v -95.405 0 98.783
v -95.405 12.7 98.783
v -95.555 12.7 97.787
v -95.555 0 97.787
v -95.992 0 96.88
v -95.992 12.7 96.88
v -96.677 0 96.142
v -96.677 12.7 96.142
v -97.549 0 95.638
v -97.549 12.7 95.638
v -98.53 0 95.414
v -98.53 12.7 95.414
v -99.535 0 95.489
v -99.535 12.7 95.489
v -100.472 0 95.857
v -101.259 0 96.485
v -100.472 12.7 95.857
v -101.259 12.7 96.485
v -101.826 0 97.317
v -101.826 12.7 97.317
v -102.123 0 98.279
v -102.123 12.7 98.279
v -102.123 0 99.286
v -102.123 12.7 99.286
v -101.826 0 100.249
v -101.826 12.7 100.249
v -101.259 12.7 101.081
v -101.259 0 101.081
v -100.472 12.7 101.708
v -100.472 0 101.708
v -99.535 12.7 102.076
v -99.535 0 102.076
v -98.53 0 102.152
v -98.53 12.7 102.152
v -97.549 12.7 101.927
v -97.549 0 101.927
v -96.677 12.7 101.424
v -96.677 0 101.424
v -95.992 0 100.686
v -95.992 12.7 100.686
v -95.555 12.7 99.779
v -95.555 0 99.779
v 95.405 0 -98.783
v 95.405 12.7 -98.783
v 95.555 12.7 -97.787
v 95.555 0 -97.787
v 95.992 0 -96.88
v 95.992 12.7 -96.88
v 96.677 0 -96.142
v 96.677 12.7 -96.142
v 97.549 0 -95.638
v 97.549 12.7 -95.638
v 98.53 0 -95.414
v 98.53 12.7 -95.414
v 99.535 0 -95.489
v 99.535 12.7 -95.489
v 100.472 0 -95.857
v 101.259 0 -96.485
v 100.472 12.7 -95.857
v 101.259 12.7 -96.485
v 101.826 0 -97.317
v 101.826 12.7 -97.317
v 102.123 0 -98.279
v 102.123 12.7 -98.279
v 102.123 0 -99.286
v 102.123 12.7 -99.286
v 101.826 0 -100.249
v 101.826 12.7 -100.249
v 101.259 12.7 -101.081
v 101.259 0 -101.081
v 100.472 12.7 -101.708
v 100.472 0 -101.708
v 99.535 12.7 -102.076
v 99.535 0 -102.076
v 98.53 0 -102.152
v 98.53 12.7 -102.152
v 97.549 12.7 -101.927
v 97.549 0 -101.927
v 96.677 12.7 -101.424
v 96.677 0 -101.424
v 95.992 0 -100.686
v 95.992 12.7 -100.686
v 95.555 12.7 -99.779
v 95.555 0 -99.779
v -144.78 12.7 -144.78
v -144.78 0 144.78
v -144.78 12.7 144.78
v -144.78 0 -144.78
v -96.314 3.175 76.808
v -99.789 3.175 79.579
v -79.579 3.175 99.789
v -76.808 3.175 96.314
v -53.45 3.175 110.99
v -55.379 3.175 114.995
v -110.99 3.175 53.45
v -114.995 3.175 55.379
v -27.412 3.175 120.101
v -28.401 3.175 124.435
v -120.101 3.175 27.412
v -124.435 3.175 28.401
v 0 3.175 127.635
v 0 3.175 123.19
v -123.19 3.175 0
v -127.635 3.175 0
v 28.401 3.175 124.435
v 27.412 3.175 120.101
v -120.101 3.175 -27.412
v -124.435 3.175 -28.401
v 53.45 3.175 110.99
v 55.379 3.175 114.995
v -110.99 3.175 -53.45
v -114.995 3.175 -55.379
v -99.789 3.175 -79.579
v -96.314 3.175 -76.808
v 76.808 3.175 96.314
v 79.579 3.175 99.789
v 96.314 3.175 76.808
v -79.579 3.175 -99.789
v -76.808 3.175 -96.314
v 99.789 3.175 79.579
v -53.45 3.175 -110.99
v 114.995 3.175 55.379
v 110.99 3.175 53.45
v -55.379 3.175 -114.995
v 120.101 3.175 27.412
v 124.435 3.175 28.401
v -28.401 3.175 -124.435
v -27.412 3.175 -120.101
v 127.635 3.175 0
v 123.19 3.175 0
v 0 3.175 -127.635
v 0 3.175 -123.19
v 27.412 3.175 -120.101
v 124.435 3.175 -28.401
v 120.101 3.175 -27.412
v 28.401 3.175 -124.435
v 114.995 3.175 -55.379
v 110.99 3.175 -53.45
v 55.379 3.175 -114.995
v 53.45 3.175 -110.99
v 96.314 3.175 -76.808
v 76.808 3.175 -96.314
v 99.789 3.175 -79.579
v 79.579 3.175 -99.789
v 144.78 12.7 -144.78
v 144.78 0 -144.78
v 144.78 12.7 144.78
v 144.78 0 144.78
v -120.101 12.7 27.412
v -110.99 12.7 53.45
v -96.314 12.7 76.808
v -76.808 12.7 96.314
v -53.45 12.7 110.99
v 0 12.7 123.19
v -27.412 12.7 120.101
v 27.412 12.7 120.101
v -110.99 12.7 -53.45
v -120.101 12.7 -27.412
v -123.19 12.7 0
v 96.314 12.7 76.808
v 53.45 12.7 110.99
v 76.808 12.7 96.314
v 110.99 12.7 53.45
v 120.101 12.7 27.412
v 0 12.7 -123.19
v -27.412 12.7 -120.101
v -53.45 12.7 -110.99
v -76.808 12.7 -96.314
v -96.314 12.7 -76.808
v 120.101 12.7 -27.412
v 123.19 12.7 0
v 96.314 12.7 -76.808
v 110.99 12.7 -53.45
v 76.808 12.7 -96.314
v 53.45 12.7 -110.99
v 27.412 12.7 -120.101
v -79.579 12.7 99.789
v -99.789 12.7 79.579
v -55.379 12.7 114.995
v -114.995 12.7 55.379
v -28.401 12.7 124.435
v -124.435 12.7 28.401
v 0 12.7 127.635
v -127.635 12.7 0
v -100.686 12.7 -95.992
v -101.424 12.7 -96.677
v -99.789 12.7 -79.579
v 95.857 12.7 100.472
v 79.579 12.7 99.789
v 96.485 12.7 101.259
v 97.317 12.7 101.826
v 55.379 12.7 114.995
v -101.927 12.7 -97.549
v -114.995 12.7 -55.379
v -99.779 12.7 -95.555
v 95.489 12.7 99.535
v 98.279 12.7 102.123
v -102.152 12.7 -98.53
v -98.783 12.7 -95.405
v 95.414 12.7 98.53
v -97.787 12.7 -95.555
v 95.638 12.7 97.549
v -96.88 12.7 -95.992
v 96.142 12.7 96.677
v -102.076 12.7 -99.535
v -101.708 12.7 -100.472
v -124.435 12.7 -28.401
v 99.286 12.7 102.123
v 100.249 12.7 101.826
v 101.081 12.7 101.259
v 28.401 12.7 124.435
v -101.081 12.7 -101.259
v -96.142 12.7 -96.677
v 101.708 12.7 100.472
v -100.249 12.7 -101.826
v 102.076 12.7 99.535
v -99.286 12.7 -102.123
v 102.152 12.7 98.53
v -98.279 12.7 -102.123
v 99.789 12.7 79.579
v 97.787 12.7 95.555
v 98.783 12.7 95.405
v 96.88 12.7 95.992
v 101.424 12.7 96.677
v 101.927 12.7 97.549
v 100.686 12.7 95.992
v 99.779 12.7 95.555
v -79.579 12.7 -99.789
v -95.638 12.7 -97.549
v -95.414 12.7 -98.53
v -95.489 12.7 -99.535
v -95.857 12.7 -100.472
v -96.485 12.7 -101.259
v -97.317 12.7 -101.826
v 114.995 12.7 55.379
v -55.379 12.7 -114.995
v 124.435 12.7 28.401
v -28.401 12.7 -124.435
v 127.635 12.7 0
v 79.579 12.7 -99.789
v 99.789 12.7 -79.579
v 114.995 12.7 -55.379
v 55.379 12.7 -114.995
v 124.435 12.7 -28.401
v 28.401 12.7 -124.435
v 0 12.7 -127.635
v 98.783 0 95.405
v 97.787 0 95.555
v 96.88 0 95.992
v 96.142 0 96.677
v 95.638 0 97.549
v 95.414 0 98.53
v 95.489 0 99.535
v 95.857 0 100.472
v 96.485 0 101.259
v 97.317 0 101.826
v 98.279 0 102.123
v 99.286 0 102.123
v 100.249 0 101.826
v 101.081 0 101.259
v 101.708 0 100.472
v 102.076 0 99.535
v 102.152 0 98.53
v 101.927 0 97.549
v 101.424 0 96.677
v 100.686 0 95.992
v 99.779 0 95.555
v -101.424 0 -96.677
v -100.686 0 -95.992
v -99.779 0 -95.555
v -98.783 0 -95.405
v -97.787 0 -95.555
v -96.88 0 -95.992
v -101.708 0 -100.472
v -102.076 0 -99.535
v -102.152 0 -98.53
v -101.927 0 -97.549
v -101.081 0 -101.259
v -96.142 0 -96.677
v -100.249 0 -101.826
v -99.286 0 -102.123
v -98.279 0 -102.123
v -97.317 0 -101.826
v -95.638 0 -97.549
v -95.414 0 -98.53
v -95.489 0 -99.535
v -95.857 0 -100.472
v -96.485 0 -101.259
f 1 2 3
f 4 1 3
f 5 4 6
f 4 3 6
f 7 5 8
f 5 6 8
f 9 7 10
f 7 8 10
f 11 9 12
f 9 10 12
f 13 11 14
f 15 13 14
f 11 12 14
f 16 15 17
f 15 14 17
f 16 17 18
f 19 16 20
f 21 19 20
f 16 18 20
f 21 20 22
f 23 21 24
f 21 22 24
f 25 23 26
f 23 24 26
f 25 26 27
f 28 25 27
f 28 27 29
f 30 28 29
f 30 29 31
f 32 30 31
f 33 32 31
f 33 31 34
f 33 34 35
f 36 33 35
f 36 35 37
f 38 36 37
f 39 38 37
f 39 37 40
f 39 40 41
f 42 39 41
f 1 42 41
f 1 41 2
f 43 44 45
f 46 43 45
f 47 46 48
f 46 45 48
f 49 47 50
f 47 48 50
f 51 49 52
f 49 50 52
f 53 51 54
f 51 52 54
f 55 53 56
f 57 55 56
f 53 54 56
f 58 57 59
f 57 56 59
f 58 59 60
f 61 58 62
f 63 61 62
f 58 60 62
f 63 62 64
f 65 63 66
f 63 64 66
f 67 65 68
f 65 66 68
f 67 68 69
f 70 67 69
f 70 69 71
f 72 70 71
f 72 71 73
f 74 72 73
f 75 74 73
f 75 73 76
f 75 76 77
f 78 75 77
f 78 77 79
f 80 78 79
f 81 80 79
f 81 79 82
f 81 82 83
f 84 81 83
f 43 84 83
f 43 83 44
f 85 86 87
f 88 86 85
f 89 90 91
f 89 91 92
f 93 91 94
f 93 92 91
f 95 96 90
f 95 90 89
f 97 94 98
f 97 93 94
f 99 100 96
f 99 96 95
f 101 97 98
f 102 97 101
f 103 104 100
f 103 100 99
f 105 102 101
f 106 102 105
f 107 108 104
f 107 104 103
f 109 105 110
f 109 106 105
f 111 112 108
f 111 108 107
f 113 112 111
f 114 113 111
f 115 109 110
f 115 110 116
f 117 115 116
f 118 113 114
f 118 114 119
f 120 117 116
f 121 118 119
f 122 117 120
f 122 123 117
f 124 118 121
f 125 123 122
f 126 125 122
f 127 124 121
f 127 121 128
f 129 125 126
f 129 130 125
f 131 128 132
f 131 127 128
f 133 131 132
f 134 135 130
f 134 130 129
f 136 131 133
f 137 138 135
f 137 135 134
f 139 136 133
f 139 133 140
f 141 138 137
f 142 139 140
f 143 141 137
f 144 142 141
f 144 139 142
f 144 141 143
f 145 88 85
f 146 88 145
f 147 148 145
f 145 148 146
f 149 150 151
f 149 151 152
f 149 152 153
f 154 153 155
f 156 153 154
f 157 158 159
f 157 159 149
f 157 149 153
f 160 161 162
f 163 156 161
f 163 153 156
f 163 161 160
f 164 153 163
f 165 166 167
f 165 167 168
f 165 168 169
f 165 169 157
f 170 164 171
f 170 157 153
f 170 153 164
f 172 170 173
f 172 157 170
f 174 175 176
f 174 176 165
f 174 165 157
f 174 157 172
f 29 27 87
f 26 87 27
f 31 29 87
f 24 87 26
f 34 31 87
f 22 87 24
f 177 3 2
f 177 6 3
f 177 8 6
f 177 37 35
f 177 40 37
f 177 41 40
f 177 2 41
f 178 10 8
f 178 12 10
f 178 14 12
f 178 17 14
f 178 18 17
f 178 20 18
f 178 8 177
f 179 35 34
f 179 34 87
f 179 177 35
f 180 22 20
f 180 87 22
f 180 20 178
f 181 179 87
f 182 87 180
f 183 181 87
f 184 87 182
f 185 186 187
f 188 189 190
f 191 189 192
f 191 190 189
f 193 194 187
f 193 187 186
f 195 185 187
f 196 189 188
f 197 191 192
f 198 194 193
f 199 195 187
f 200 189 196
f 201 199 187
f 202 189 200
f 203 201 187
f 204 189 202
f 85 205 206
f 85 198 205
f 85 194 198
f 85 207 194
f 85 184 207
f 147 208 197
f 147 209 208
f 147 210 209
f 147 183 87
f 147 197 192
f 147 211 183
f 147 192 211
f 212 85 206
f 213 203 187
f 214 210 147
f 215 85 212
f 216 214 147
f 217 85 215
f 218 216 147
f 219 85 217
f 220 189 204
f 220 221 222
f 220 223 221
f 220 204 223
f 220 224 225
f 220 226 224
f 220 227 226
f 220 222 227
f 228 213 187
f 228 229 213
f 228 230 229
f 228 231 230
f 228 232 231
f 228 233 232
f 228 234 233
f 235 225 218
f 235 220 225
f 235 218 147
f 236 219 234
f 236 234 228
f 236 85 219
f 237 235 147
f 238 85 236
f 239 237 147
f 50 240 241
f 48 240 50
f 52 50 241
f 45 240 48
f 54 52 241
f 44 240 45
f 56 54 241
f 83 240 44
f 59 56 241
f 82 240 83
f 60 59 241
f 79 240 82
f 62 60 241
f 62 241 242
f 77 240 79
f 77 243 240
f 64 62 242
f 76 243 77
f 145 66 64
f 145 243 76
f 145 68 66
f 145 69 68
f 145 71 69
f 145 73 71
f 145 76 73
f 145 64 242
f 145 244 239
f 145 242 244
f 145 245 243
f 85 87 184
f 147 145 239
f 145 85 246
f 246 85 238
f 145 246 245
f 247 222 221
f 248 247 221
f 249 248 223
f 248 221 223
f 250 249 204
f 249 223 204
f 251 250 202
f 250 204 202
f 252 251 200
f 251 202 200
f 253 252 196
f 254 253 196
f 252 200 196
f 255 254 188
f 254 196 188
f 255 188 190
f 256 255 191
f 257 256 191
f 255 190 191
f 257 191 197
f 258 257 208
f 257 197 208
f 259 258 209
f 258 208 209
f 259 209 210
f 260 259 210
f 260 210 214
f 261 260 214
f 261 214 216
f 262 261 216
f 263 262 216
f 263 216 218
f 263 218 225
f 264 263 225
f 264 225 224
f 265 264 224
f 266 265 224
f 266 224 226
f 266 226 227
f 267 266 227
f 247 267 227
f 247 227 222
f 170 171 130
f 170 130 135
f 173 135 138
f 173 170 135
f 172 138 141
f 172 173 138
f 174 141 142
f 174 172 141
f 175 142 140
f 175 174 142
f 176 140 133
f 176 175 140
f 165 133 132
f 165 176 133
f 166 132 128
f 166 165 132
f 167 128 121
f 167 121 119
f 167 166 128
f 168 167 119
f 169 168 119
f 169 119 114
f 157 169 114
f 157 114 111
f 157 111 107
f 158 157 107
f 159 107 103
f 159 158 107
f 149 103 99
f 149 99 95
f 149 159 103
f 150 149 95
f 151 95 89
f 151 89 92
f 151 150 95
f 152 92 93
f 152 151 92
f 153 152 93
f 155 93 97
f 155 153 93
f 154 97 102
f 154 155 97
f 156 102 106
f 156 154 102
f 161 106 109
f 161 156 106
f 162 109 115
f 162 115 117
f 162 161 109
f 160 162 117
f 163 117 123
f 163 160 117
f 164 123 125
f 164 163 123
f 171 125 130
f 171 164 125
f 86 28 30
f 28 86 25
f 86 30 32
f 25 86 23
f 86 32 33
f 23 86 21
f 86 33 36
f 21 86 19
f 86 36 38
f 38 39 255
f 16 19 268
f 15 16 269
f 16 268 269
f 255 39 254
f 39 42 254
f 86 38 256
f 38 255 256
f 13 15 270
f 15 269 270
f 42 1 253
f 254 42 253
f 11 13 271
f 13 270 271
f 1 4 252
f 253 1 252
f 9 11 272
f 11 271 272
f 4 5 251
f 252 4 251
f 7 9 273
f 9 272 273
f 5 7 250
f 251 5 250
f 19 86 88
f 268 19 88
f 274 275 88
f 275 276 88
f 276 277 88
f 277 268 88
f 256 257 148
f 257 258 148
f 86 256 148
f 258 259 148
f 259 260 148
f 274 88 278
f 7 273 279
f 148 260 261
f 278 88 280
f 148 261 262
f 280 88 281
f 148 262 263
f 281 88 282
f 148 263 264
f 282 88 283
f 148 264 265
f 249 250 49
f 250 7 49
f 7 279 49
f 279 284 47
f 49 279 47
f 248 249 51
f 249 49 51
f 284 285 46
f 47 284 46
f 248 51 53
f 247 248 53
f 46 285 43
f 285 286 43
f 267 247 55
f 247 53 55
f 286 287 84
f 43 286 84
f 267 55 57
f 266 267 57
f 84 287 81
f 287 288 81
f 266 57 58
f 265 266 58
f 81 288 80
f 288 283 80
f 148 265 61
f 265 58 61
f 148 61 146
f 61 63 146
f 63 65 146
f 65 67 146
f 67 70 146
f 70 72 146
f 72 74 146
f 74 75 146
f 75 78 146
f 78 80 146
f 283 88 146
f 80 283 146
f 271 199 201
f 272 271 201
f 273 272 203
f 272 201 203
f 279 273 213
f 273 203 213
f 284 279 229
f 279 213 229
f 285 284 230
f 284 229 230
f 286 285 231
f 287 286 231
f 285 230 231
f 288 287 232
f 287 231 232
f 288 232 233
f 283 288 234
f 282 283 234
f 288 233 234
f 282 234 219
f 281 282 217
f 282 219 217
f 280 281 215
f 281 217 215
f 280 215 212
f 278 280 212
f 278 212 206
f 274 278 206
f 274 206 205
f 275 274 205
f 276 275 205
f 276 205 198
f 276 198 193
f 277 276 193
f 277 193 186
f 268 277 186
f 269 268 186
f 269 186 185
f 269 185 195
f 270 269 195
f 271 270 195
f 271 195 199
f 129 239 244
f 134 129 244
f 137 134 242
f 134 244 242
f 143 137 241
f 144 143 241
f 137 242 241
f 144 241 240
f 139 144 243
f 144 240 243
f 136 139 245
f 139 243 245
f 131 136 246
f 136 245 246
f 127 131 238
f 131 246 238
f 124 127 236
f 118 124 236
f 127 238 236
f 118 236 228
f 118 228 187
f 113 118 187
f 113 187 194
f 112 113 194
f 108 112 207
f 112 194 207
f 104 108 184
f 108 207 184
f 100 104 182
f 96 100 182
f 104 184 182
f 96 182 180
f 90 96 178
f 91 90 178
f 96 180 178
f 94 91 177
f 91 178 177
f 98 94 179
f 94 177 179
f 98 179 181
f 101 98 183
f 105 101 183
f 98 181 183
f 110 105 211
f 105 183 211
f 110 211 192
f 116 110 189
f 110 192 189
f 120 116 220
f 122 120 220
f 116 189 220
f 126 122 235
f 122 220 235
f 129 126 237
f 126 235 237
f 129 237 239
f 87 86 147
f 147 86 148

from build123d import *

# Parameters (mm, degrees)
SKETCH1_W               = 289.56
SKETCH1_H               = 289.56
BOSS_EXTRUDE1_DEPTH     = 12.7
SKETCH7_R               = 127.635
SKETCH7_R_2             = 123.19
CUT_EXTRUDE1_DEPTH      = 9.525
F_1_4_CLEARANCE_HOLE1_D = 6.7564
CIRPATTERN1_COUNT       = 4


with BuildPart() as part:
    # Sketch1 → Boss-Extrude1 (new body)
    with BuildSketch(Plane(origin=(0, 0, 0), x_dir=(1, 0, 0), z_dir=(0, 1, 0))):
        Rectangle(SKETCH1_W, SKETCH1_H)
    extrude(amount=BOSS_EXTRUDE1_DEPTH)

    # Sketch7 → Cut-Extrude1 (cut)
    with BuildSketch(Plane(origin=(0, 12.7, 0), x_dir=(1, 0, 0), z_dir=(0, 1, 0))):
        Circle(SKETCH7_R)
        Circle(SKETCH7_R_2, mode=Mode.SUBTRACT)
    extrude(amount=-CUT_EXTRUDE1_DEPTH, mode=Mode.SUBTRACT)

    # 1/4 Clearance Hole1 (through all)
    with Locations(Plane(origin=(0, 0, 0), x_dir=(-1, 0, 0), z_dir=(0, -1, 0))):
        with Locations((98.782817332, -98.782817332)):
            f_1_4_clearance_hole1 = Hole(F_1_4_CLEARANCE_HOLE1_D / 2)

    # CirPattern1: 1/4 Clearance Hole1 ×4 about axis
    cirpattern1_axis = Axis((0, 0, 0), (0, 1, 0))
    for i in range(1, CIRPATTERN1_COUNT):
        add(f_1_4_clearance_hole1.rotate(cirpattern1_axis, i * 360 / CIRPATTERN1_COUNT), mode=Mode.SUBTRACT)


solid = part.part
